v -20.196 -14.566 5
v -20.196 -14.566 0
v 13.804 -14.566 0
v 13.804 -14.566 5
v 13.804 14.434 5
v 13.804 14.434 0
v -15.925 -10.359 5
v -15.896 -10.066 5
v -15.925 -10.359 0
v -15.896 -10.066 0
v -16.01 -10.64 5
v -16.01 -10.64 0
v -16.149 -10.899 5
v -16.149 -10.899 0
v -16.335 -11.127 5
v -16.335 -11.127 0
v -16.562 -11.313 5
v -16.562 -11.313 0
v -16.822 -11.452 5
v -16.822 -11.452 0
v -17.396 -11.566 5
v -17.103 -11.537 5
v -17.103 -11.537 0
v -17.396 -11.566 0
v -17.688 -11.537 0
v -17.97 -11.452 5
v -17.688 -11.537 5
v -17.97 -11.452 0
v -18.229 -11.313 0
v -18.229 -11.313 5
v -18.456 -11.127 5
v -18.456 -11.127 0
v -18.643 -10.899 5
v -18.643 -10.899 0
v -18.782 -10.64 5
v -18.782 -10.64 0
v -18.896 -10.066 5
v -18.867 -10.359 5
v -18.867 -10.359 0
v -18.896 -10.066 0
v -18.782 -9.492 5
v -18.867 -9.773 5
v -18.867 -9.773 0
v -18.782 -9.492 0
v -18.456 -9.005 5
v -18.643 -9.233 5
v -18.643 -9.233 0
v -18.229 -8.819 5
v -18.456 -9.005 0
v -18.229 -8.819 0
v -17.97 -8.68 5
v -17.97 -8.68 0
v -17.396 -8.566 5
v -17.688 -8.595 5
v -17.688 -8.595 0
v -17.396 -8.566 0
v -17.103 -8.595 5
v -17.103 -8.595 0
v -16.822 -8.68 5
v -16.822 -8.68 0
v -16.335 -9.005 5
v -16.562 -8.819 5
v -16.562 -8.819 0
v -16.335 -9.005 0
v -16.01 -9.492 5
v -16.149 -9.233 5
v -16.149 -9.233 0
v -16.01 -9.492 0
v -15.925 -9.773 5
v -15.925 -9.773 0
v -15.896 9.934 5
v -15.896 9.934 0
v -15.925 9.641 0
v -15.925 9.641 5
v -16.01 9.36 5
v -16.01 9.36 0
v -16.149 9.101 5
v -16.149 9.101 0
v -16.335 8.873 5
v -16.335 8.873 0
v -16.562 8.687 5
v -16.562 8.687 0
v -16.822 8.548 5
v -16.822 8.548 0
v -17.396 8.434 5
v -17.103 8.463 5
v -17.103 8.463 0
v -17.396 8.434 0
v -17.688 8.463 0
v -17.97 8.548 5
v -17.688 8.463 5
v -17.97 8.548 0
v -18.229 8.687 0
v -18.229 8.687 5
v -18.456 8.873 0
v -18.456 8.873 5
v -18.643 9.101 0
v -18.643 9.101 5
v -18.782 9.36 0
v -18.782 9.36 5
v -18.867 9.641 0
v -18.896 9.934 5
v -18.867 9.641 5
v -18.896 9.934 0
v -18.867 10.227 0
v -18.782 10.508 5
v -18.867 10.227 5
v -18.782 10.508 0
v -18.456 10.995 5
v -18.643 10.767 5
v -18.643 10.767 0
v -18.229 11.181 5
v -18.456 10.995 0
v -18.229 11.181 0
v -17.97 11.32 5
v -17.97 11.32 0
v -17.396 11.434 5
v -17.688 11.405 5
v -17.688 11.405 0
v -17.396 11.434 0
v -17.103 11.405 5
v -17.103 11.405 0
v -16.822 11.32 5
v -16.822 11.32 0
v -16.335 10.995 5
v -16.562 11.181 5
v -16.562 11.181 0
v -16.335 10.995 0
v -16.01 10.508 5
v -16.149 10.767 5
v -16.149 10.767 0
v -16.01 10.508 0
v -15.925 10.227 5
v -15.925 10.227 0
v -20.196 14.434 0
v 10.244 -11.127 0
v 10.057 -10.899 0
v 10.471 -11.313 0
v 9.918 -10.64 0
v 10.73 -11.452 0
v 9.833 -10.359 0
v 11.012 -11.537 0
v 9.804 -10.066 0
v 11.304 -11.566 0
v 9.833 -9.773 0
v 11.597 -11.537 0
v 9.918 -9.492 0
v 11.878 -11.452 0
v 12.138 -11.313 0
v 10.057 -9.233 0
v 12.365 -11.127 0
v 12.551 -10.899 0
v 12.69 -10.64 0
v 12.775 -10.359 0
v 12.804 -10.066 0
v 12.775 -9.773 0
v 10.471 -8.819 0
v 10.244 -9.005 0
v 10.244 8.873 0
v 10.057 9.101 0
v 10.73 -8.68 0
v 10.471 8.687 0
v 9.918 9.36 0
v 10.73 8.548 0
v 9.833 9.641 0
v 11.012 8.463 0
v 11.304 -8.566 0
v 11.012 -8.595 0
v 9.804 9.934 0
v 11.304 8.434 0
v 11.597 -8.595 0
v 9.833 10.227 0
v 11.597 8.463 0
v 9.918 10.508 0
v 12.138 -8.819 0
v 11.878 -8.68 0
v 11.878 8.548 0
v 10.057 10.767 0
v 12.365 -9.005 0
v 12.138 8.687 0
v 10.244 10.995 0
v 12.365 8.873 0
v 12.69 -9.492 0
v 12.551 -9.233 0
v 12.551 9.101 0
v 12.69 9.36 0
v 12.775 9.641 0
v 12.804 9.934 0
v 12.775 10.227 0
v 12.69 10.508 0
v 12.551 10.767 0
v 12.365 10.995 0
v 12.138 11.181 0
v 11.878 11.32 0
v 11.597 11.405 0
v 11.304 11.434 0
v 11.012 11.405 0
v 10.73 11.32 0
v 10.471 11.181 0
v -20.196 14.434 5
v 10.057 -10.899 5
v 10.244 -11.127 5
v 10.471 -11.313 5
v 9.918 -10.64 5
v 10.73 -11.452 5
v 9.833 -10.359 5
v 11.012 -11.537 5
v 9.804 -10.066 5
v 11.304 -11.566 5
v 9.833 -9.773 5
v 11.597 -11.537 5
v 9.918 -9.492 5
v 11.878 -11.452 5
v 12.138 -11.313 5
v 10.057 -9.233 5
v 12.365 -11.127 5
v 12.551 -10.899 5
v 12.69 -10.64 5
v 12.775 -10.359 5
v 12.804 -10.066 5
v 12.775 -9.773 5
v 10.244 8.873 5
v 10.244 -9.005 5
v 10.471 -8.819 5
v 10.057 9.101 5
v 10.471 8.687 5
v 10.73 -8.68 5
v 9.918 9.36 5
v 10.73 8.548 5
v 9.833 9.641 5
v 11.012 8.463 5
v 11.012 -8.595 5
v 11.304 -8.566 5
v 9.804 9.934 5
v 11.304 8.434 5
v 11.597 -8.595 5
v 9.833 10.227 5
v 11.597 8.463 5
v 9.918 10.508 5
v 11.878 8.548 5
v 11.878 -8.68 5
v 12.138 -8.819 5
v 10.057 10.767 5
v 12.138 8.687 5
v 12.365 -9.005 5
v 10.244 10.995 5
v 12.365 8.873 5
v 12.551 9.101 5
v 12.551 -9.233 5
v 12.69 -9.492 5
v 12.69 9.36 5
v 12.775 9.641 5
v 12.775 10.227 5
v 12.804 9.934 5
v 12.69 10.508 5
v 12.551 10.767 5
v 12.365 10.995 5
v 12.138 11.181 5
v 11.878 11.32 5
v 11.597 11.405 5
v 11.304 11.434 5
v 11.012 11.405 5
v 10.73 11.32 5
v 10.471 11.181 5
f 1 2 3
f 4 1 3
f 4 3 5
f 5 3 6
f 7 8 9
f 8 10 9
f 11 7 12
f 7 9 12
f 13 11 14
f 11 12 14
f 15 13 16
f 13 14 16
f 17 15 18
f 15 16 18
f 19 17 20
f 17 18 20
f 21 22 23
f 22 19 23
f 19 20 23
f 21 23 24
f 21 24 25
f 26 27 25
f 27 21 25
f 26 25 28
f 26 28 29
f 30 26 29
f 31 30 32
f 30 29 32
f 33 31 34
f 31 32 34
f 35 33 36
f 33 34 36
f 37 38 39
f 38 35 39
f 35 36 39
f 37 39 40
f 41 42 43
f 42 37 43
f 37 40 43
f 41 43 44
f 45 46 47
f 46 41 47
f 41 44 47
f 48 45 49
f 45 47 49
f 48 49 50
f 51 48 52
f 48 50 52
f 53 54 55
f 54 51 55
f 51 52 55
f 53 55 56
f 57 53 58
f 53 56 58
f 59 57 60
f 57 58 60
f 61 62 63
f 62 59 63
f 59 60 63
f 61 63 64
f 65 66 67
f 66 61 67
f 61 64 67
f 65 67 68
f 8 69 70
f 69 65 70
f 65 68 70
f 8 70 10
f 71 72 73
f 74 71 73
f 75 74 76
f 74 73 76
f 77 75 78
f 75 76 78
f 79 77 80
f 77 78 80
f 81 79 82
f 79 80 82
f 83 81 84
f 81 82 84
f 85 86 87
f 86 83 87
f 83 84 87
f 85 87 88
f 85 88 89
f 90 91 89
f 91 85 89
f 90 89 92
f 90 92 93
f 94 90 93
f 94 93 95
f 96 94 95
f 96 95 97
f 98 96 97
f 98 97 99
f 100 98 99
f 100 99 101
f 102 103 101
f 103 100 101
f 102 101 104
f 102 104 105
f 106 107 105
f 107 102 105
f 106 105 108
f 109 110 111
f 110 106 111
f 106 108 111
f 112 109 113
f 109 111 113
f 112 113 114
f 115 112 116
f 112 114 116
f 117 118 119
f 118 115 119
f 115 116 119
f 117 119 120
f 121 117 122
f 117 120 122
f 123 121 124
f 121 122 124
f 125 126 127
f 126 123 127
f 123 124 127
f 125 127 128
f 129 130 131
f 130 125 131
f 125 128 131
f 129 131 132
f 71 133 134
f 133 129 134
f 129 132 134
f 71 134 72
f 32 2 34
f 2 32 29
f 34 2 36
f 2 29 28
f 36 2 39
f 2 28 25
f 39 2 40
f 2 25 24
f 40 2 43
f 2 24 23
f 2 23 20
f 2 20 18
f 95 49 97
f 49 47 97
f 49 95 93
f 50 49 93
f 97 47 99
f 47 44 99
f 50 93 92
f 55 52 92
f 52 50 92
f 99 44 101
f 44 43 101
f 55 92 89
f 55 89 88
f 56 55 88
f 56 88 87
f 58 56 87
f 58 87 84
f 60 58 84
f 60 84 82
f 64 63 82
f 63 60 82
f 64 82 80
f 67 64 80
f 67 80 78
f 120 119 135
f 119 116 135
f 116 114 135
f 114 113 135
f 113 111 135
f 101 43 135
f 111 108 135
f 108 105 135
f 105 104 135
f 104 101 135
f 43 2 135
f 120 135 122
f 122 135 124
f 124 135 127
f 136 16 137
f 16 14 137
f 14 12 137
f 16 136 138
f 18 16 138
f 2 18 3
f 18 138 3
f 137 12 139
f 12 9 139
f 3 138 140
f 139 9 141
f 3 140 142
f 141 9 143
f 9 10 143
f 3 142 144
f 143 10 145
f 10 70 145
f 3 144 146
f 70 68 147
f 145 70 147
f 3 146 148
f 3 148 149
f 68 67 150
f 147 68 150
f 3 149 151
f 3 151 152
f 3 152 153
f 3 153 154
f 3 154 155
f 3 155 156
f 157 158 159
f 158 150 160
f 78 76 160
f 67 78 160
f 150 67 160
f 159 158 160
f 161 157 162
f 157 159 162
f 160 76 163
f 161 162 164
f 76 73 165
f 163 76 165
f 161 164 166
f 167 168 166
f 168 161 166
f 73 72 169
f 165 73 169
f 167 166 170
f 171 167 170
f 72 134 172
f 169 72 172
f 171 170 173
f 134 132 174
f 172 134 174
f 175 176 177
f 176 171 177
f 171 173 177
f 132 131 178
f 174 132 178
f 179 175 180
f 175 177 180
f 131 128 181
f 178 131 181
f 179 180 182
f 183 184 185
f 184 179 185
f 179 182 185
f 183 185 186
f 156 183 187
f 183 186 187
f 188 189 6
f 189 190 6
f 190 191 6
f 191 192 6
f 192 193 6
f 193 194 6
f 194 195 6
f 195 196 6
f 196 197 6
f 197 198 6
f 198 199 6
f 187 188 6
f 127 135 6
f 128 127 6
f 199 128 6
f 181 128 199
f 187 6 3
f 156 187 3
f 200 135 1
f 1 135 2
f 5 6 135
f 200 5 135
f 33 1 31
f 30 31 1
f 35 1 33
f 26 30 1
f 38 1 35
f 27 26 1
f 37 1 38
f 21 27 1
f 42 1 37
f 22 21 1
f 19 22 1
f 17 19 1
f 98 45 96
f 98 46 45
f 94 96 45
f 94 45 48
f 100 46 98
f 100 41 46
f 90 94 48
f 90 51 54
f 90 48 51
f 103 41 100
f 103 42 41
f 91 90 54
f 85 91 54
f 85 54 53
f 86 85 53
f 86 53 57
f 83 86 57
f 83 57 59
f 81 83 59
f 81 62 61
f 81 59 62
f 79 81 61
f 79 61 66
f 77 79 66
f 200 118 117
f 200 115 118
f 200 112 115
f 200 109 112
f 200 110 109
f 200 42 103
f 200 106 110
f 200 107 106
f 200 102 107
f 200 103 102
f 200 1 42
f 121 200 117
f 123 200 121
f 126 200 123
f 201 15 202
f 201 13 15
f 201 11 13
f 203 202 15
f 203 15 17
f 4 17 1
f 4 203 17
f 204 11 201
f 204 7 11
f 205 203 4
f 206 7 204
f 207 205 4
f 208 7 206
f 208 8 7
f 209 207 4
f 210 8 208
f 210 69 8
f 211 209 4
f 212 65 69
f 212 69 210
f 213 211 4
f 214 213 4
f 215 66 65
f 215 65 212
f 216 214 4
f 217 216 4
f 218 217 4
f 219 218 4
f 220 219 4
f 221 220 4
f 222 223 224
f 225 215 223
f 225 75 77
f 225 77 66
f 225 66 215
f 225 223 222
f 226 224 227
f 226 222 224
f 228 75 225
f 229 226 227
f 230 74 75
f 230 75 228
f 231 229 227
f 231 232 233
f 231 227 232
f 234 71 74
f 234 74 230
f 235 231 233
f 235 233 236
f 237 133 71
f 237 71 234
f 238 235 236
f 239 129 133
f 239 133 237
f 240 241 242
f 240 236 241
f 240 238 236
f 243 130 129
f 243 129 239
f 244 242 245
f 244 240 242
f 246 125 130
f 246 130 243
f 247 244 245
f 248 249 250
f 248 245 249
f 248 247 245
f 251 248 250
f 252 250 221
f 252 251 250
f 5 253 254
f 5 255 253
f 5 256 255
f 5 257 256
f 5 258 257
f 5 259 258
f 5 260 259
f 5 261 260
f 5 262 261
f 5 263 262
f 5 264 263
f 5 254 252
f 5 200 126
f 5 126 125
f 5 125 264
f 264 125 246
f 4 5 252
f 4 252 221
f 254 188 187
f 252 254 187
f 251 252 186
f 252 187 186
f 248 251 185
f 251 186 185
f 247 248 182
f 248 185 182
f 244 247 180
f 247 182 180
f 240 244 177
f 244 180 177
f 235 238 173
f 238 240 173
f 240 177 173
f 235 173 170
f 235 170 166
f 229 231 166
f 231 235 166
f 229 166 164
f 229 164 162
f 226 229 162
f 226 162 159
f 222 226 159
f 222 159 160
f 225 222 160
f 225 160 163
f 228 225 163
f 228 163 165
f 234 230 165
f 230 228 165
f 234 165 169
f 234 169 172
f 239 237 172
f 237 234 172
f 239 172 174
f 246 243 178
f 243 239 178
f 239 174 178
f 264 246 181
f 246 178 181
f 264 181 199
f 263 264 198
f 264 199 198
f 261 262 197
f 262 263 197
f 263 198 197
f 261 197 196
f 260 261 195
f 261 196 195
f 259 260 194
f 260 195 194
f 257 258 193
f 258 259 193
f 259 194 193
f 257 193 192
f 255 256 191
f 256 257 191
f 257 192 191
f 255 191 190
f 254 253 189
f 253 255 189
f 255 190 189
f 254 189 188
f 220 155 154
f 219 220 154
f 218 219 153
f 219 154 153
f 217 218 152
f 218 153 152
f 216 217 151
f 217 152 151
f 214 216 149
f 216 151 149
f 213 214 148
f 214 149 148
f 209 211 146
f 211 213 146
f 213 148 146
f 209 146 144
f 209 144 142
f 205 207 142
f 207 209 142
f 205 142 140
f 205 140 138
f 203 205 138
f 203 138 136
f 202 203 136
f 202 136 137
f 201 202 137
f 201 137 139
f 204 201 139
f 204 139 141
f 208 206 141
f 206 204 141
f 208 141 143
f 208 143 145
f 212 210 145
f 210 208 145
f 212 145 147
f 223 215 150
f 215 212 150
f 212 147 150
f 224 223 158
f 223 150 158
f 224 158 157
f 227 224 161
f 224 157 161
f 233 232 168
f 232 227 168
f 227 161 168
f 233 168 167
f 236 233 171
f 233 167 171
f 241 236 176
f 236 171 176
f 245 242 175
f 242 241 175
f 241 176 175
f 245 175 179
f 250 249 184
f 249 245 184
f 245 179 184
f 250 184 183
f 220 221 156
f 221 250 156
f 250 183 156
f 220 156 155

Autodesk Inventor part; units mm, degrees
ref_plane "YZ Plane" through (0, 0, 0) normal (1, 0, 0) x (0, 1, 0)
ref_plane "XZ Plane" through (0, 0, 0) normal (0, 1, 0) x (-1, 0, 0)
ref_plane "XY Plane" through (0, 0, 0) normal (0, 0, 1) x (1, 0, 0)
sketch "Sketch1" plane through (0, 0, 0) normal (0, 0, 1) x (1, 0, 0)
  line L0 (-20.1958, -14.566) -> (13.8042, -14.566)
  line L1 (13.8042, -14.566) -> (13.8042, 14.434)
  line L2 (13.8042, 14.434) -> (-20.1958, 14.434)
  line L3 (-20.1958, 14.434) -> (-20.1958, -14.566)
  circle A0 centre (11.3042, 9.934) radius 1.5
  circle A1 centre (11.3042, -10.066) radius 1.5
  circle A2 centre (-17.3958, 9.934) radius 1.5
  circle A3 centre (-17.3958, -10.066) radius 1.5
  point P0 (0, 0)
  dimension "d1" = 34
  dimension "d2" = 3
  dimension "d3" = 3
  dimension "d4" = 20
  dimension "d5" = 3
  dimension "d6" = 3
  dimension "d8" = 28.7
  dimension "d9" = 2.5
  dimension "d10" = 20
  dimension "d11" = 29
  dimension "d12" = 4.5
extrude "Extrusion1" add sketch "Sketch1" along normal blind 5
thread "Thread1" size "M3x0.5" class "6H" standard "ANSI Metric M Profile" length 5
thread "Thread2" size "M3x0.5" class "6H" standard "ANSI Metric M Profile" length 5
thread "Thread3" size "M3x0.5" class "6H" standard "ANSI Metric M Profile" length 5
thread "Thread4" size "M3x0.5" class "6H" standard "ANSI Metric M Profile" length 5
sketch "Sketch3" plane through (0, 0, 5) normal (0, 0, 1) x (1, 0, 0)
  line L0 (-9.0293, 4.1042) -> (2.8565, 4.1042) construction
  line L1 (2.8565, 4.1042) -> (2.8565, -3.7102) construction
  line L2 (2.8565, -3.7102) -> (-9.0293, -3.7102) construction
  line L3 (-9.0293, -3.7102) -> (-9.0293, 4.1042) construction
  point P0 (0, 0)
  dimension "d3" = 3
properties material "ABS Plastic"
